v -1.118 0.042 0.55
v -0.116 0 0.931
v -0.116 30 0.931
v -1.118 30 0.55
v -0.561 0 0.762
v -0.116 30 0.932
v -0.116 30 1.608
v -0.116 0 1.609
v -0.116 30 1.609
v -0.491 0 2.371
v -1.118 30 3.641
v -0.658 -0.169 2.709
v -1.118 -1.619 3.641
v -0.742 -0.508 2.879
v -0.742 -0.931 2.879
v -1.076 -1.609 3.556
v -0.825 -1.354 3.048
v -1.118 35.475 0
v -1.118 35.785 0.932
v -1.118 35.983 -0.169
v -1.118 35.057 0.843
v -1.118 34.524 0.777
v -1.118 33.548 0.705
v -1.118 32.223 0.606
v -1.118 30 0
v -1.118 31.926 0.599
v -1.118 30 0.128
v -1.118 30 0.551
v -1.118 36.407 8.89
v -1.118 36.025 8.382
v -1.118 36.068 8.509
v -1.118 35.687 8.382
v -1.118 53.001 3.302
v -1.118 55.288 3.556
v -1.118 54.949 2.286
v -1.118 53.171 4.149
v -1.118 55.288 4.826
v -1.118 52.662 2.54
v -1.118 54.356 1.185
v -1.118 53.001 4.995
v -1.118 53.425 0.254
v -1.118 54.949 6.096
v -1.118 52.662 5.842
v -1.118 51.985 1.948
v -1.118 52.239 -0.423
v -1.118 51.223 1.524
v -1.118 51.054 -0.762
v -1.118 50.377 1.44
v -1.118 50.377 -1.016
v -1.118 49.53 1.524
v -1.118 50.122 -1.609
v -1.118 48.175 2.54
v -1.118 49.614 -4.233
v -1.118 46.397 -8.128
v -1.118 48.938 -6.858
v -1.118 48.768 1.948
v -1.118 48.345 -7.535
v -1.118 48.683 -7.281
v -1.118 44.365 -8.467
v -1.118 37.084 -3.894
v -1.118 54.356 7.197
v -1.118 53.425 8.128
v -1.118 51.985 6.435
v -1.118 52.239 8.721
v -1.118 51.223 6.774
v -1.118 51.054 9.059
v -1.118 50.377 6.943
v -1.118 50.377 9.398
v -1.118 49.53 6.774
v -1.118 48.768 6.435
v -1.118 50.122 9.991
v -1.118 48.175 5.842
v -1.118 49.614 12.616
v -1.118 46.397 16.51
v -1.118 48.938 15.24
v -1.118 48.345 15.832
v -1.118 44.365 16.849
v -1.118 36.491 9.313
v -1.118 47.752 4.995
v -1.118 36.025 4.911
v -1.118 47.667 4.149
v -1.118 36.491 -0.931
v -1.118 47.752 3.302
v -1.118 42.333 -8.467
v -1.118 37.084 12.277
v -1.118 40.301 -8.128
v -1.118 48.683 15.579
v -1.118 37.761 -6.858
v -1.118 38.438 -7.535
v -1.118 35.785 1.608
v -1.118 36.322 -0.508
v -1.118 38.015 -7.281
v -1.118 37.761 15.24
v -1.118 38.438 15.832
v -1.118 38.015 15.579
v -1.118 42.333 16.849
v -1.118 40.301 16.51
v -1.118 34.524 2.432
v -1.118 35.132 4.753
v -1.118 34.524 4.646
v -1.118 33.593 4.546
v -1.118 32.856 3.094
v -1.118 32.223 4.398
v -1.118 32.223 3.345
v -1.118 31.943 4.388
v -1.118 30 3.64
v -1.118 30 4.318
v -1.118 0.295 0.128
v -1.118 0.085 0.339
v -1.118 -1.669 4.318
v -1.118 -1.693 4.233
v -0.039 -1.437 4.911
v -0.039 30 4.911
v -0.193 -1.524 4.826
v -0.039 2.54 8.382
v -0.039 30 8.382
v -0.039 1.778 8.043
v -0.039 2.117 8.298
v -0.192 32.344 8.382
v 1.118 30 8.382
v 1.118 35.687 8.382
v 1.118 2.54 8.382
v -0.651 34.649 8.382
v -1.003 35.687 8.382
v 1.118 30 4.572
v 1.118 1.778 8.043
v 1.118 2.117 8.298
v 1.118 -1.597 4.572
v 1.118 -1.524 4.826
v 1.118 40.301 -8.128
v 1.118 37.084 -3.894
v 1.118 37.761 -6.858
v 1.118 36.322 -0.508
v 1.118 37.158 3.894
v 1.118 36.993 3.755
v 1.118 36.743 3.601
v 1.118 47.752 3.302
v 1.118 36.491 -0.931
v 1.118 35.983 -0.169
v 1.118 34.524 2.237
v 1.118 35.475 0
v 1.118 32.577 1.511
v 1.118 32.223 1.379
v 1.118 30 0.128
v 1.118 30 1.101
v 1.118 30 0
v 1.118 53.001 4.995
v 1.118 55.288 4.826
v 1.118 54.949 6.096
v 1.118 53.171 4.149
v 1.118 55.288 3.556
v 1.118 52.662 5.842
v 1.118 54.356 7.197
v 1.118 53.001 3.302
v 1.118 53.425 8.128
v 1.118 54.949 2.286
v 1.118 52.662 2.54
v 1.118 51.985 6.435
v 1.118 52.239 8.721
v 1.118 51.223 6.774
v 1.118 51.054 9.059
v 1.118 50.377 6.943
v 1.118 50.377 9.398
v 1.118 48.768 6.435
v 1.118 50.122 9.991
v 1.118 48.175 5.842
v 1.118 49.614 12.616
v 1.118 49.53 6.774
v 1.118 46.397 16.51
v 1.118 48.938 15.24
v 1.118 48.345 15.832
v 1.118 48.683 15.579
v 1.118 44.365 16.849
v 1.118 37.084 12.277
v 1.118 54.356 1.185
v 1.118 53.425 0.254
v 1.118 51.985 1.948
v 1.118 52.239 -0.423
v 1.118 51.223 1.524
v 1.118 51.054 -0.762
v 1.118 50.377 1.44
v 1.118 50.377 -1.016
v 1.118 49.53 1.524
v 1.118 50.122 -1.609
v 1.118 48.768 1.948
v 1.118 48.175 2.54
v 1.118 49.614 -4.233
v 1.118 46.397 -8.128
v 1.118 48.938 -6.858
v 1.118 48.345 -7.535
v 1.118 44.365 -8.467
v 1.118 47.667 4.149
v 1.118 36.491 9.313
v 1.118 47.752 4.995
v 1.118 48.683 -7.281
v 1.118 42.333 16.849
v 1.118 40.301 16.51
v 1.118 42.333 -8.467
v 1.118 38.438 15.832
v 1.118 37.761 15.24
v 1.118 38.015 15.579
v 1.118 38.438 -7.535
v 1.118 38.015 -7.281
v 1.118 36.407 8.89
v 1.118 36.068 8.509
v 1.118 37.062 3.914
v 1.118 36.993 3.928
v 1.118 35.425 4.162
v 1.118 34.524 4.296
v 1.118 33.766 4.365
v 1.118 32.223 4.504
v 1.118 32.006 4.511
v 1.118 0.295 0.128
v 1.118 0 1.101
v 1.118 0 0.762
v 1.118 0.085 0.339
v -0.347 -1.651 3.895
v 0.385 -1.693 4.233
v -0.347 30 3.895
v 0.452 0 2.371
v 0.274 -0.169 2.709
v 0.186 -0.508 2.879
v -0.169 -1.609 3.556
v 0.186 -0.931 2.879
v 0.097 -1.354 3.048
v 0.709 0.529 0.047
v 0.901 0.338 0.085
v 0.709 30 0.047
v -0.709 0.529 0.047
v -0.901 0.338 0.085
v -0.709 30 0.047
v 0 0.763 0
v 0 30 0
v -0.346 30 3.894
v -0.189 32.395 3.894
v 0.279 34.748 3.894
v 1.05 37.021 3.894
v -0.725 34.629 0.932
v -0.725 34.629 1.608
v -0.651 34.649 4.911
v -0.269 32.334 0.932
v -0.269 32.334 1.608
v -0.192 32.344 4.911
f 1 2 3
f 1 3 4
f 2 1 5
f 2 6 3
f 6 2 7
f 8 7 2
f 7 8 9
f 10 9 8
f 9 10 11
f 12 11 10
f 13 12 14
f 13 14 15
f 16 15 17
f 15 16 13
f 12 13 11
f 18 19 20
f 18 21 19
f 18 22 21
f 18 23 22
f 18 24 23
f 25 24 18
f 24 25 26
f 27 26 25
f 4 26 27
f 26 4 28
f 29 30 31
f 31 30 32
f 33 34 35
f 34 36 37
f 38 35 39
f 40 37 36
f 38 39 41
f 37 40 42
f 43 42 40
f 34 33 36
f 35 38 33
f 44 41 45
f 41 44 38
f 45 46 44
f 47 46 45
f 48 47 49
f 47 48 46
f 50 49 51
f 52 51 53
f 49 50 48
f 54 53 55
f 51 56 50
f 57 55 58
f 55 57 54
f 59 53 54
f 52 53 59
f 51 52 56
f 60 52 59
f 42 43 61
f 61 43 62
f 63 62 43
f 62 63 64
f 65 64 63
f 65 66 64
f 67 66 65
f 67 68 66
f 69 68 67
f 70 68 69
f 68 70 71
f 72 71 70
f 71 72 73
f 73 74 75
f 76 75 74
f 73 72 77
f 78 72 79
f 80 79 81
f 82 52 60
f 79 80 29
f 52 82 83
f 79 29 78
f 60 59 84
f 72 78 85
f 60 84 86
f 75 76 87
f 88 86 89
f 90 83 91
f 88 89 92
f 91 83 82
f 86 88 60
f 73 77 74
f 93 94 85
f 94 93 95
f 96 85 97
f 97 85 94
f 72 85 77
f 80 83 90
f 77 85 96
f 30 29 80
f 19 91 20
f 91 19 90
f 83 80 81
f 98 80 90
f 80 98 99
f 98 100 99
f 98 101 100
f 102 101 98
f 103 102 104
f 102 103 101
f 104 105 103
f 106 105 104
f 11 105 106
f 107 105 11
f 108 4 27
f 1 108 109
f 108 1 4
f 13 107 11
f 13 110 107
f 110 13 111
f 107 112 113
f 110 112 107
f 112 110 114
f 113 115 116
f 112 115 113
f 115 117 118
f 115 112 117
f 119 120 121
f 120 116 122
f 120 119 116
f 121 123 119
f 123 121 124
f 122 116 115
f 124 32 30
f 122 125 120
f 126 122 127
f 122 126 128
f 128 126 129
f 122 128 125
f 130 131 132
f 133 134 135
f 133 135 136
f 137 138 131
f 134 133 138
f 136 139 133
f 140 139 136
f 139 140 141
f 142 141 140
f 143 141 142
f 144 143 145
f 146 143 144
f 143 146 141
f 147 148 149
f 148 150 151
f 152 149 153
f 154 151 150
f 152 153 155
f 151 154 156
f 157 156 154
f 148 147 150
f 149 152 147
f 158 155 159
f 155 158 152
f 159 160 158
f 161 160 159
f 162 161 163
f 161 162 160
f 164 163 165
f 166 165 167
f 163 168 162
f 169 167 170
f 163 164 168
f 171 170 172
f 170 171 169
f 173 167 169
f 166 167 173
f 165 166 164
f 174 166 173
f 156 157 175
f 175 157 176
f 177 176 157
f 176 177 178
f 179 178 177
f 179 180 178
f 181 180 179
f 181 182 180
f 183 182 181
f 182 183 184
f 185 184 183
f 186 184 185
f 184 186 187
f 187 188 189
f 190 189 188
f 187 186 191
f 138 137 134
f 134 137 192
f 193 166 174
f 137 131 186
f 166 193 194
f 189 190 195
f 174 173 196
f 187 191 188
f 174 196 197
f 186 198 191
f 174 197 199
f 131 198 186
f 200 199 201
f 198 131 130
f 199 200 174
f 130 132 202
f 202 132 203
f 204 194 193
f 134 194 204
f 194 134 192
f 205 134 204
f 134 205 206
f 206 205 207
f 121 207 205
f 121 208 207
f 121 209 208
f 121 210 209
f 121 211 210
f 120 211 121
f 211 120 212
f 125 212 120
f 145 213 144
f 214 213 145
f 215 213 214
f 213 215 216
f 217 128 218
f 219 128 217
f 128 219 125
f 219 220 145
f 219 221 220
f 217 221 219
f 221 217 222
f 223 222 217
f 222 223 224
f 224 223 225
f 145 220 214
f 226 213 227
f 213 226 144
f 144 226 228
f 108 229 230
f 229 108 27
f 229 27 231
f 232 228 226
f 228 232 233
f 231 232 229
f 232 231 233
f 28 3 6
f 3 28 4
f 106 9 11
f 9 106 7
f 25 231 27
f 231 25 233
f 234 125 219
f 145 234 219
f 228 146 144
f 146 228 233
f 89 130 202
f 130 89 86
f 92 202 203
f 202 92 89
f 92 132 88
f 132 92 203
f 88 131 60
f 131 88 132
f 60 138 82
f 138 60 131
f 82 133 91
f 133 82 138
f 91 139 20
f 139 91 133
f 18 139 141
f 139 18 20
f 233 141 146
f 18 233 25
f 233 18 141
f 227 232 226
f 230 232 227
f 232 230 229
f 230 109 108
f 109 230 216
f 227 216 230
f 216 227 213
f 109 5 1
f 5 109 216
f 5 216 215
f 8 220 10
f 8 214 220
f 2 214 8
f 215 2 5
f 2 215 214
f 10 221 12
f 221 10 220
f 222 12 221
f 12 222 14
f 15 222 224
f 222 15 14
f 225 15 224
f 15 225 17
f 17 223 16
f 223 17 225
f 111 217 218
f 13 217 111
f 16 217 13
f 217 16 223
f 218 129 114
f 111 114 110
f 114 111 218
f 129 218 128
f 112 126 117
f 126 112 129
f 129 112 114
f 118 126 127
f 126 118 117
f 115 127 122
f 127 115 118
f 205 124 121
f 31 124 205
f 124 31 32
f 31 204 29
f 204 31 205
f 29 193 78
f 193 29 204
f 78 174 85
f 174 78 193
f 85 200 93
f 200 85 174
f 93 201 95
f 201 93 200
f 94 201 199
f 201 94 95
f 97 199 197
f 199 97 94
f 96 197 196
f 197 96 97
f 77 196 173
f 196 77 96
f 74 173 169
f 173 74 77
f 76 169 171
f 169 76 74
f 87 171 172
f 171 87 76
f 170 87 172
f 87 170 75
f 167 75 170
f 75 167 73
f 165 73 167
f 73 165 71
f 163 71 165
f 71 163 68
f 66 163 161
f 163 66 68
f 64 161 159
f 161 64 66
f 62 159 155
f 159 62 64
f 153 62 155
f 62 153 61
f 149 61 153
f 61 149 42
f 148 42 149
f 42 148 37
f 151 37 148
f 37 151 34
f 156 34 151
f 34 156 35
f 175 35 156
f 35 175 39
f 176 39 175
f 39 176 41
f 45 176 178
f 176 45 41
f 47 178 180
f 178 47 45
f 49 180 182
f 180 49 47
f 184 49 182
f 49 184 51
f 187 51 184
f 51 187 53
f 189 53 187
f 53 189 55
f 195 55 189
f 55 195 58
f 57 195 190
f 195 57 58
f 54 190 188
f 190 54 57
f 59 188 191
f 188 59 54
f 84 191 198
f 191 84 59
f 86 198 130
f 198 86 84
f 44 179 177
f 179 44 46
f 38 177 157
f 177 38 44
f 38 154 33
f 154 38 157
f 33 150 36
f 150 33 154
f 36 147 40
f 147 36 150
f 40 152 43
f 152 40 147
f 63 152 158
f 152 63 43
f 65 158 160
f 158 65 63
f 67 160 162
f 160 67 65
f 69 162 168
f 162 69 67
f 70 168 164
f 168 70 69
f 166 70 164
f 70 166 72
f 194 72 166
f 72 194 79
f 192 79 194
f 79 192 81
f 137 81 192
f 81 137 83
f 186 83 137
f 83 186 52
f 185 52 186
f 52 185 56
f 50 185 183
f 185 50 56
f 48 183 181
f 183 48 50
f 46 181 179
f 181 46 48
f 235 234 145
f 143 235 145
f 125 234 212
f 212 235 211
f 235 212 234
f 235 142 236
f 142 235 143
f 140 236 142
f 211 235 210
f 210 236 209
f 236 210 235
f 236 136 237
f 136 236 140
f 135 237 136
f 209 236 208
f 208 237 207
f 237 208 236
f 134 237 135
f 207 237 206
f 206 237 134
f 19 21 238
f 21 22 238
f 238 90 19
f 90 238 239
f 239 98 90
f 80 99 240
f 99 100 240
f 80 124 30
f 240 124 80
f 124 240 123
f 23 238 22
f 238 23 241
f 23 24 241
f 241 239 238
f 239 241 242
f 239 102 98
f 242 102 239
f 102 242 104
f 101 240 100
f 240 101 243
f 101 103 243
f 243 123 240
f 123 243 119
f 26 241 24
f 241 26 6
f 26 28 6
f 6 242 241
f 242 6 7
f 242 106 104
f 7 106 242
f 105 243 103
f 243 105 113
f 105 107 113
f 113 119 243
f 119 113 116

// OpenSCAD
// file: gen/best.gen.scad
// Automatically generated using the Inkscape to OpenSCAD Converter
// Variable names are of the form <inkscape-path-id>_points and
// <inkscape-path-id>_paths. As a result, you can associate a polygon in this
// OpenSCAD program with the corresponding SVG element in the Inkscape document
// by looking for the XML element with the attribute id="inkscape-path-id".

outline_points = [[-37.333813, 12.657868], [-39.365728, 12.318871], [-41.313410, 11.641393], [-41.651891, 11.387663], [-41.906138, 11.049182], [-42.583099, 8.424540], [-43.091077, 5.799897], [-43.345325, 5.207168], [-44.022802, 4.868171], [-45.207741, 4.529693], [-46.393197, 3.936963], [-47.324405, 3.005755], [-47.917133, 1.905048], [-48.256130, 0.634843], [-48.256130, -0.634846], [-47.917133, -1.905051], [-47.324405, -3.005755], [-46.393197, -3.936963], [-45.207741, -4.614441], [-44.022802, -4.952922], [-43.345325, -5.207171], [-43.091077, -5.799897], [-42.583099, -8.424540], [-41.906138, -11.049182], [-41.651891, -11.472411], [-41.313410, -11.726144], [-39.365728, -12.318871], [-37.333813, -12.657868], [-35.301899, -12.657868], [-33.269984, -12.318871], [-31.407051, -11.726144], [-30.983822, -11.472411], [-30.730089, -11.049182], [-30.052614, -8.085543], [-29.459885, -5.122419], [-29.290387, -4.699190], [-28.951906, -4.360193], [-28.443928, -4.191082], [6.268840, -4.191082], [6.692901, -4.106463], [6.946633, -3.852215], [7.031382, -3.428985], [7.031382, -1.820299], [7.200879, -1.481821], [7.539360, -1.312321], [7.962589, -1.312321], [8.385819, -1.142824], [8.640067, -0.634846], [8.724816, 0.042116], [8.555319, 0.634843], [5.253199, 3.852215], [4.914718, 4.106463], [4.491488, 4.190907], [-28.655801, 4.190907], [-29.036655, 4.317817], [-29.375136, 4.699190], [-29.459885, 5.122419], [-30.052614, 8.085543], [-30.730089, 11.049182], [-30.983822, 11.387663], [-31.407051, 11.641393], [-33.269984, 12.318871], [-35.301899, 12.657868], [-43.345325, 2.751507], [-42.498349, 2.582526], [-41.736640, 2.243529], [-41.143912, 1.650802], [-40.720682, 0.804343], [-40.635933, -0.042116], [-40.720682, -0.889091], [-41.143912, -1.650802], [-41.736640, -2.243529], [-42.498349, -2.666759], [-43.345325, -2.751510], [-44.191784, -2.666759], [-44.954010, -2.243529], [-45.630971, -1.650802], [-45.969968, -0.889091], [-46.139466, -0.042116], [-45.969968, 0.804343], [-45.630971, 1.650802], [-44.954010, 2.243529], [-44.191784, 2.582526]];
outline_paths = [[0, 1, 2, 3, 4, 5, 6, 7, 8, 9, 10, 11, 12, 13, 14, 15, 16, 17, 18, 19, 20, 21, 22, 23, 24, 25, 26, 27, 28, 29, 30, 31, 32, 33, 34, 35, 36, 37, 38, 39, 40, 41, 42, 43, 44, 45, 46, 47, 48, 49, 50, 51, 52, 53, 54, 55, 56, 57, 58, 59, 60, 61, 62], [82, 81, 80, 79, 78, 77, 76, 75, 74, 73, 72, 71, 70, 69, 68, 67, 66, 65, 64, 63]];

engrave_points = [[-31.576537, 11.218252], [-33.439203, 11.810919], [-35.386500, 12.149585], [-37.333904, 12.149585], [-39.196534, 11.810919], [-41.059201, 11.218252], [-41.397867, 10.879586], [-42.075200, 8.339586], [-42.583235, 5.714920], [-42.837200, 5.122254], [-43.260533, 4.614254], [-43.937866, 4.360254], [-45.038533, 4.106254], [-46.054533, 3.513587], [-46.901199, 2.666921], [-47.493865, 1.650921], [-47.747865, 0.550255], [-47.747865, -0.635078], [-47.493865, -1.735745], [-46.901199, -2.751744], [-46.054533, -3.513744], [-45.038533, -4.106411], [-43.937866, -4.445077], [-43.260533, -4.614411], [-42.837200, -5.122410], [-42.583235, -5.715077], [-42.075200, -8.339743], [-41.397867, -10.879742], [-41.059201, -11.218409], [-39.196534, -11.895742], [-37.333904, -12.149742], [-35.386500, -12.149742], [-33.439203, -11.895742], [-31.576537, -11.218409], [-31.237870, -10.879742], [-30.391203, -7.323743], [-29.798536, -3.683078], [-29.629203, -0.042412], [-29.798536, 3.682921], [-30.391203, 7.323587], [-31.237870, 10.879586]];
engrave_paths = [[0, 1, 2, 3, 4, 5, 6, 7, 8, 9, 10, 11, 12, 13, 14, 15, 16, 17, 18, 19, 20, 21, 22, 23, 24, 25, 26, 27, 28, 29, 30, 31, 32, 33, 34, 35, 36, 37, 38, 39, 40]];

warding_fm_points = [[47.023010, -3.259811], [47.023010, -2.497811], [48.256130, -1.312476], [48.256130, -0.889151], [46.868870, 0.973519], [46.868870, 4.190849], [46.021130, 4.190849], [46.021130, 1.312199], [46.945970, 0.211529], [47.177140, -0.211801], [47.254240, -0.719811], [47.177140, -1.227811], [46.945970, -1.651151], [46.252340, -2.667141], [46.021130, -2.836481], [46.021130, -4.191150], [47.485430, -4.191150], [47.485430, -3.344496]];
warding_fm_paths = [[0, 1, 2, 3, 4, 5, 6, 7, 8, 9, 10, 11, 12, 13, 14, 15, 16, 17]];

warding_a_points = [[12.018432, -3.640818], [12.018432, -4.191150], [10.785218, -4.191150], [9.783232, -4.191150], [9.783232, -3.090482], [11.247640, -0.296483], [9.783232, 0.380850], [9.783232, 4.190849], [10.939370, 4.190849], [10.939370, 0.719517], [12.018432, 0.126850], [12.018432, -0.550483], [11.016446, -2.582483], [11.016446, -3.259816]];
warding_a_paths = [[0, 1, 2, 3, 4, 5, 6, 7, 8, 9, 10, 11, 12, 13]];

warding_b_points = [[22.879667, -3.344482], [22.879667, -2.328482], [23.757703, -1.312482], [23.757703, -0.465818], [22.720025, 0.888849], [22.720025, 4.190849], [21.522703, 4.190849], [21.522703, 0.550182], [22.720025, -0.889151], [21.522703, -2.159148], [21.522703, -4.191150], [23.358596, -4.191150], [23.358596, -3.344482]];
warding_b_paths = [[0, 1, 2, 3, 4, 5, 6, 7, 8, 9, 10, 11, 12]];

warding_c_points = [[30.657525, -1.481817], [31.899192, -0.381151], [30.657525, 0.296148], [30.657525, 4.190849], [31.733630, 4.190849], [31.733630, 0.973516], [32.892525, 0.211516], [32.892525, -0.889151], [31.899192, -1.735817], [31.899192, -3.175185], [32.395858, -3.175185], [32.395858, -4.191150], [30.657525, -4.191150]];
warding_c_paths = [[0, 1, 2, 3, 4, 5, 6, 7, 8, 9, 10, 11, 12]];

//polygon(points=outline_points, paths=outline_paths);
//polygon(points=engrave_points, paths=engrave_paths);
//polygon(points=warding_fm_points, paths=warding_fm_paths);
//polygon(points=warding_a_points, paths=warding_a_paths);
//polygon(points=warding_b_points, paths=warding_b_paths);
//polygon(points=warding_c_points, paths=warding_c_paths);
// main file
use <keygen.scad>
include <gen/best.gen.scad>

module best(bitting="",
            outline_name="1A Standard",
            warding_name="A") {

    name = "Best SFIC";

    /*
        Bitting is specified from tip to bow, 0-9, with 0 being the shallowest cut and 9 being the deepest.
        Example: 2536326
    */

    outlines_k = ["1A Standard"];
    outlines_v = [[outline_points, outline_paths,
                   [-outline_points[42][0], -outline_points[37][1]],
                   engrave_points,
                   engrave_paths]];
    wardings_k = ["A",
                  "B",
                  "C",
                  "FM"];
    wardings_v = [warding_a_points,
                  warding_b_points,
                  warding_c_points,
                  warding_fm_points];

    outline_param = key_lkup(outlines_k, outlines_v, outline_name);
    outline_points = outline_param[0];
    outline_paths = outline_param[1];
    offset = outline_param[2];
    engrave_points = outline_param[3];
    engrave_paths = outline_param[4];

    warding_points = key_lkup(wardings_k, wardings_v, warding_name);

    // Best A2 system    
    cut_locations = [for(i=[.080, .230, .380, .530, .680, .830, .980]) -i*25.4];
    depth_table = [for(i=[0.318:-0.0125:0.205]) i*25.4];

    heights = key_code_to_heights(bitting, depth_table);

    difference() {
        if($children == 0) {
            key_blank(outline_points,
                      warding_points,
                      outline_paths=outline_paths,
                      //engrave_right_points=engrave_points,
                      //engrave_right_paths=engrave_paths,
                      //engrave_left_points=engrave_points,
                      //engrave_left_paths=engrave_paths,
                      offset=offset,
                      milling_offset=30,
                      plug_diameter=10.8712);
        } else {
            children(0);
        }
        key_bitting(heights, cut_locations, .7874);
    }
}

// Defaults
bitting="";
outline="1A Standard";
warding="A";
best(bitting, outline, warding);
